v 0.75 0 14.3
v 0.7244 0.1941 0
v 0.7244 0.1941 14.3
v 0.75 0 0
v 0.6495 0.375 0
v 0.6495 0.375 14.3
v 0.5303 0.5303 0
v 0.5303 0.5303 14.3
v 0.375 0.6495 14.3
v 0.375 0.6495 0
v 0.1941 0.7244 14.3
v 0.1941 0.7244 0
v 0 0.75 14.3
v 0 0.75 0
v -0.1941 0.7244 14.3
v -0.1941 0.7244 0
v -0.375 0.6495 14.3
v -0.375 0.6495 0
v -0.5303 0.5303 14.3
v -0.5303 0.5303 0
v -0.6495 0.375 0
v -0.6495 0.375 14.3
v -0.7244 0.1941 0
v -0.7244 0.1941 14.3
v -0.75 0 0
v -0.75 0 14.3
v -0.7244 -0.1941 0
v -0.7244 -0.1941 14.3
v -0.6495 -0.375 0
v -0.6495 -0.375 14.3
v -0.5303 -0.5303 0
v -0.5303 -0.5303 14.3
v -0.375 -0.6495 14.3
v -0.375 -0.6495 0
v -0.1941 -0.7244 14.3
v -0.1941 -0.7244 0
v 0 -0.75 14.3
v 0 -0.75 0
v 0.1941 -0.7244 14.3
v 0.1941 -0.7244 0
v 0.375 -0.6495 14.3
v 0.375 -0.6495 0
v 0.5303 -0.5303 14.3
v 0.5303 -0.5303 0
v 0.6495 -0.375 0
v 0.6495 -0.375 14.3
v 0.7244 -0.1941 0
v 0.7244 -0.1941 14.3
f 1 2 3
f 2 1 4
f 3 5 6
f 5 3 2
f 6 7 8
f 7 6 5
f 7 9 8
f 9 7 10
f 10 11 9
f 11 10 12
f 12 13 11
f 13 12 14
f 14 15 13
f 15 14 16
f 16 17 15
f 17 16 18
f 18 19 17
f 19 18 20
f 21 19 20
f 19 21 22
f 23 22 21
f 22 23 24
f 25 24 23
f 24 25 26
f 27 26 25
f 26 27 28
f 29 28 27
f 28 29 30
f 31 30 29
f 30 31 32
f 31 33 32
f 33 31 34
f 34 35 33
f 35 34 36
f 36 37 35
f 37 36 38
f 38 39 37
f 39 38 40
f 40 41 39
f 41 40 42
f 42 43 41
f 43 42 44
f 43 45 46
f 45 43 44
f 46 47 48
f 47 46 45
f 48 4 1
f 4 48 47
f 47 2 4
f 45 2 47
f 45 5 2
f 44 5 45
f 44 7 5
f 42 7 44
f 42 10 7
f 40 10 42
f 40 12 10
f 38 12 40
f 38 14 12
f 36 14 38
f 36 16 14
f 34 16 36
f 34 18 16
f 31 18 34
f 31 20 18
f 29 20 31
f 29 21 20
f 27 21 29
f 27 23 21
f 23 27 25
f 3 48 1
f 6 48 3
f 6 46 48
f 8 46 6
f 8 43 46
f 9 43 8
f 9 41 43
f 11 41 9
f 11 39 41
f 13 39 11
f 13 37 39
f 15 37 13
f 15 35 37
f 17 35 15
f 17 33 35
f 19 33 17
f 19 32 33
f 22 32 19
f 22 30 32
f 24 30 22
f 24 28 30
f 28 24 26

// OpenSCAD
// part_id: jup15
// name: Jupiter orb rod large
// source_drawing_ids: DRW-012
// units: mm
// revision: 0.1
// SPDX-License-Identifier: MIT

module part_jup15(d = 1.5, h = 14.3) {
    cylinder(d = d, h = h, center = false, $fn = 24);
}

// ---- "main guard" ----
// Default to previewing when opened directly:
if (is_undef(__LIB_MODE__)) {
    part_jup15();
}
